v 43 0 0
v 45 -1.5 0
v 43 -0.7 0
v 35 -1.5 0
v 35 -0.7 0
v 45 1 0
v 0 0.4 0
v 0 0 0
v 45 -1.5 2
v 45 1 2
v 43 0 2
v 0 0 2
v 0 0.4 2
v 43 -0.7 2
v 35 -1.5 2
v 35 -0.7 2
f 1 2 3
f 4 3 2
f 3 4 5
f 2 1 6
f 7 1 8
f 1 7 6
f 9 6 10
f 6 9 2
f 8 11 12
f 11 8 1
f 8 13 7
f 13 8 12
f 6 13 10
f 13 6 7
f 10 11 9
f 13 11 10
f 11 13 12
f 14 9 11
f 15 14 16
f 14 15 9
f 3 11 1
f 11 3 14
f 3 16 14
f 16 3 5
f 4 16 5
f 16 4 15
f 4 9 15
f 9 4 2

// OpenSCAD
// Variablen
width=2;
min_height=0.4;
length=45;

// Code
linear_extrude(height = width)
polygon(points = [[0,0], [0, min_height],  [length, 1.0], [length,0]]);

linear_extrude(height = width)
polygon(points = [[length,0],[length,-1.5],[length-10,-1.5],[length-10,-0.7],[length-2,-0.7],[length-2,0]]);
